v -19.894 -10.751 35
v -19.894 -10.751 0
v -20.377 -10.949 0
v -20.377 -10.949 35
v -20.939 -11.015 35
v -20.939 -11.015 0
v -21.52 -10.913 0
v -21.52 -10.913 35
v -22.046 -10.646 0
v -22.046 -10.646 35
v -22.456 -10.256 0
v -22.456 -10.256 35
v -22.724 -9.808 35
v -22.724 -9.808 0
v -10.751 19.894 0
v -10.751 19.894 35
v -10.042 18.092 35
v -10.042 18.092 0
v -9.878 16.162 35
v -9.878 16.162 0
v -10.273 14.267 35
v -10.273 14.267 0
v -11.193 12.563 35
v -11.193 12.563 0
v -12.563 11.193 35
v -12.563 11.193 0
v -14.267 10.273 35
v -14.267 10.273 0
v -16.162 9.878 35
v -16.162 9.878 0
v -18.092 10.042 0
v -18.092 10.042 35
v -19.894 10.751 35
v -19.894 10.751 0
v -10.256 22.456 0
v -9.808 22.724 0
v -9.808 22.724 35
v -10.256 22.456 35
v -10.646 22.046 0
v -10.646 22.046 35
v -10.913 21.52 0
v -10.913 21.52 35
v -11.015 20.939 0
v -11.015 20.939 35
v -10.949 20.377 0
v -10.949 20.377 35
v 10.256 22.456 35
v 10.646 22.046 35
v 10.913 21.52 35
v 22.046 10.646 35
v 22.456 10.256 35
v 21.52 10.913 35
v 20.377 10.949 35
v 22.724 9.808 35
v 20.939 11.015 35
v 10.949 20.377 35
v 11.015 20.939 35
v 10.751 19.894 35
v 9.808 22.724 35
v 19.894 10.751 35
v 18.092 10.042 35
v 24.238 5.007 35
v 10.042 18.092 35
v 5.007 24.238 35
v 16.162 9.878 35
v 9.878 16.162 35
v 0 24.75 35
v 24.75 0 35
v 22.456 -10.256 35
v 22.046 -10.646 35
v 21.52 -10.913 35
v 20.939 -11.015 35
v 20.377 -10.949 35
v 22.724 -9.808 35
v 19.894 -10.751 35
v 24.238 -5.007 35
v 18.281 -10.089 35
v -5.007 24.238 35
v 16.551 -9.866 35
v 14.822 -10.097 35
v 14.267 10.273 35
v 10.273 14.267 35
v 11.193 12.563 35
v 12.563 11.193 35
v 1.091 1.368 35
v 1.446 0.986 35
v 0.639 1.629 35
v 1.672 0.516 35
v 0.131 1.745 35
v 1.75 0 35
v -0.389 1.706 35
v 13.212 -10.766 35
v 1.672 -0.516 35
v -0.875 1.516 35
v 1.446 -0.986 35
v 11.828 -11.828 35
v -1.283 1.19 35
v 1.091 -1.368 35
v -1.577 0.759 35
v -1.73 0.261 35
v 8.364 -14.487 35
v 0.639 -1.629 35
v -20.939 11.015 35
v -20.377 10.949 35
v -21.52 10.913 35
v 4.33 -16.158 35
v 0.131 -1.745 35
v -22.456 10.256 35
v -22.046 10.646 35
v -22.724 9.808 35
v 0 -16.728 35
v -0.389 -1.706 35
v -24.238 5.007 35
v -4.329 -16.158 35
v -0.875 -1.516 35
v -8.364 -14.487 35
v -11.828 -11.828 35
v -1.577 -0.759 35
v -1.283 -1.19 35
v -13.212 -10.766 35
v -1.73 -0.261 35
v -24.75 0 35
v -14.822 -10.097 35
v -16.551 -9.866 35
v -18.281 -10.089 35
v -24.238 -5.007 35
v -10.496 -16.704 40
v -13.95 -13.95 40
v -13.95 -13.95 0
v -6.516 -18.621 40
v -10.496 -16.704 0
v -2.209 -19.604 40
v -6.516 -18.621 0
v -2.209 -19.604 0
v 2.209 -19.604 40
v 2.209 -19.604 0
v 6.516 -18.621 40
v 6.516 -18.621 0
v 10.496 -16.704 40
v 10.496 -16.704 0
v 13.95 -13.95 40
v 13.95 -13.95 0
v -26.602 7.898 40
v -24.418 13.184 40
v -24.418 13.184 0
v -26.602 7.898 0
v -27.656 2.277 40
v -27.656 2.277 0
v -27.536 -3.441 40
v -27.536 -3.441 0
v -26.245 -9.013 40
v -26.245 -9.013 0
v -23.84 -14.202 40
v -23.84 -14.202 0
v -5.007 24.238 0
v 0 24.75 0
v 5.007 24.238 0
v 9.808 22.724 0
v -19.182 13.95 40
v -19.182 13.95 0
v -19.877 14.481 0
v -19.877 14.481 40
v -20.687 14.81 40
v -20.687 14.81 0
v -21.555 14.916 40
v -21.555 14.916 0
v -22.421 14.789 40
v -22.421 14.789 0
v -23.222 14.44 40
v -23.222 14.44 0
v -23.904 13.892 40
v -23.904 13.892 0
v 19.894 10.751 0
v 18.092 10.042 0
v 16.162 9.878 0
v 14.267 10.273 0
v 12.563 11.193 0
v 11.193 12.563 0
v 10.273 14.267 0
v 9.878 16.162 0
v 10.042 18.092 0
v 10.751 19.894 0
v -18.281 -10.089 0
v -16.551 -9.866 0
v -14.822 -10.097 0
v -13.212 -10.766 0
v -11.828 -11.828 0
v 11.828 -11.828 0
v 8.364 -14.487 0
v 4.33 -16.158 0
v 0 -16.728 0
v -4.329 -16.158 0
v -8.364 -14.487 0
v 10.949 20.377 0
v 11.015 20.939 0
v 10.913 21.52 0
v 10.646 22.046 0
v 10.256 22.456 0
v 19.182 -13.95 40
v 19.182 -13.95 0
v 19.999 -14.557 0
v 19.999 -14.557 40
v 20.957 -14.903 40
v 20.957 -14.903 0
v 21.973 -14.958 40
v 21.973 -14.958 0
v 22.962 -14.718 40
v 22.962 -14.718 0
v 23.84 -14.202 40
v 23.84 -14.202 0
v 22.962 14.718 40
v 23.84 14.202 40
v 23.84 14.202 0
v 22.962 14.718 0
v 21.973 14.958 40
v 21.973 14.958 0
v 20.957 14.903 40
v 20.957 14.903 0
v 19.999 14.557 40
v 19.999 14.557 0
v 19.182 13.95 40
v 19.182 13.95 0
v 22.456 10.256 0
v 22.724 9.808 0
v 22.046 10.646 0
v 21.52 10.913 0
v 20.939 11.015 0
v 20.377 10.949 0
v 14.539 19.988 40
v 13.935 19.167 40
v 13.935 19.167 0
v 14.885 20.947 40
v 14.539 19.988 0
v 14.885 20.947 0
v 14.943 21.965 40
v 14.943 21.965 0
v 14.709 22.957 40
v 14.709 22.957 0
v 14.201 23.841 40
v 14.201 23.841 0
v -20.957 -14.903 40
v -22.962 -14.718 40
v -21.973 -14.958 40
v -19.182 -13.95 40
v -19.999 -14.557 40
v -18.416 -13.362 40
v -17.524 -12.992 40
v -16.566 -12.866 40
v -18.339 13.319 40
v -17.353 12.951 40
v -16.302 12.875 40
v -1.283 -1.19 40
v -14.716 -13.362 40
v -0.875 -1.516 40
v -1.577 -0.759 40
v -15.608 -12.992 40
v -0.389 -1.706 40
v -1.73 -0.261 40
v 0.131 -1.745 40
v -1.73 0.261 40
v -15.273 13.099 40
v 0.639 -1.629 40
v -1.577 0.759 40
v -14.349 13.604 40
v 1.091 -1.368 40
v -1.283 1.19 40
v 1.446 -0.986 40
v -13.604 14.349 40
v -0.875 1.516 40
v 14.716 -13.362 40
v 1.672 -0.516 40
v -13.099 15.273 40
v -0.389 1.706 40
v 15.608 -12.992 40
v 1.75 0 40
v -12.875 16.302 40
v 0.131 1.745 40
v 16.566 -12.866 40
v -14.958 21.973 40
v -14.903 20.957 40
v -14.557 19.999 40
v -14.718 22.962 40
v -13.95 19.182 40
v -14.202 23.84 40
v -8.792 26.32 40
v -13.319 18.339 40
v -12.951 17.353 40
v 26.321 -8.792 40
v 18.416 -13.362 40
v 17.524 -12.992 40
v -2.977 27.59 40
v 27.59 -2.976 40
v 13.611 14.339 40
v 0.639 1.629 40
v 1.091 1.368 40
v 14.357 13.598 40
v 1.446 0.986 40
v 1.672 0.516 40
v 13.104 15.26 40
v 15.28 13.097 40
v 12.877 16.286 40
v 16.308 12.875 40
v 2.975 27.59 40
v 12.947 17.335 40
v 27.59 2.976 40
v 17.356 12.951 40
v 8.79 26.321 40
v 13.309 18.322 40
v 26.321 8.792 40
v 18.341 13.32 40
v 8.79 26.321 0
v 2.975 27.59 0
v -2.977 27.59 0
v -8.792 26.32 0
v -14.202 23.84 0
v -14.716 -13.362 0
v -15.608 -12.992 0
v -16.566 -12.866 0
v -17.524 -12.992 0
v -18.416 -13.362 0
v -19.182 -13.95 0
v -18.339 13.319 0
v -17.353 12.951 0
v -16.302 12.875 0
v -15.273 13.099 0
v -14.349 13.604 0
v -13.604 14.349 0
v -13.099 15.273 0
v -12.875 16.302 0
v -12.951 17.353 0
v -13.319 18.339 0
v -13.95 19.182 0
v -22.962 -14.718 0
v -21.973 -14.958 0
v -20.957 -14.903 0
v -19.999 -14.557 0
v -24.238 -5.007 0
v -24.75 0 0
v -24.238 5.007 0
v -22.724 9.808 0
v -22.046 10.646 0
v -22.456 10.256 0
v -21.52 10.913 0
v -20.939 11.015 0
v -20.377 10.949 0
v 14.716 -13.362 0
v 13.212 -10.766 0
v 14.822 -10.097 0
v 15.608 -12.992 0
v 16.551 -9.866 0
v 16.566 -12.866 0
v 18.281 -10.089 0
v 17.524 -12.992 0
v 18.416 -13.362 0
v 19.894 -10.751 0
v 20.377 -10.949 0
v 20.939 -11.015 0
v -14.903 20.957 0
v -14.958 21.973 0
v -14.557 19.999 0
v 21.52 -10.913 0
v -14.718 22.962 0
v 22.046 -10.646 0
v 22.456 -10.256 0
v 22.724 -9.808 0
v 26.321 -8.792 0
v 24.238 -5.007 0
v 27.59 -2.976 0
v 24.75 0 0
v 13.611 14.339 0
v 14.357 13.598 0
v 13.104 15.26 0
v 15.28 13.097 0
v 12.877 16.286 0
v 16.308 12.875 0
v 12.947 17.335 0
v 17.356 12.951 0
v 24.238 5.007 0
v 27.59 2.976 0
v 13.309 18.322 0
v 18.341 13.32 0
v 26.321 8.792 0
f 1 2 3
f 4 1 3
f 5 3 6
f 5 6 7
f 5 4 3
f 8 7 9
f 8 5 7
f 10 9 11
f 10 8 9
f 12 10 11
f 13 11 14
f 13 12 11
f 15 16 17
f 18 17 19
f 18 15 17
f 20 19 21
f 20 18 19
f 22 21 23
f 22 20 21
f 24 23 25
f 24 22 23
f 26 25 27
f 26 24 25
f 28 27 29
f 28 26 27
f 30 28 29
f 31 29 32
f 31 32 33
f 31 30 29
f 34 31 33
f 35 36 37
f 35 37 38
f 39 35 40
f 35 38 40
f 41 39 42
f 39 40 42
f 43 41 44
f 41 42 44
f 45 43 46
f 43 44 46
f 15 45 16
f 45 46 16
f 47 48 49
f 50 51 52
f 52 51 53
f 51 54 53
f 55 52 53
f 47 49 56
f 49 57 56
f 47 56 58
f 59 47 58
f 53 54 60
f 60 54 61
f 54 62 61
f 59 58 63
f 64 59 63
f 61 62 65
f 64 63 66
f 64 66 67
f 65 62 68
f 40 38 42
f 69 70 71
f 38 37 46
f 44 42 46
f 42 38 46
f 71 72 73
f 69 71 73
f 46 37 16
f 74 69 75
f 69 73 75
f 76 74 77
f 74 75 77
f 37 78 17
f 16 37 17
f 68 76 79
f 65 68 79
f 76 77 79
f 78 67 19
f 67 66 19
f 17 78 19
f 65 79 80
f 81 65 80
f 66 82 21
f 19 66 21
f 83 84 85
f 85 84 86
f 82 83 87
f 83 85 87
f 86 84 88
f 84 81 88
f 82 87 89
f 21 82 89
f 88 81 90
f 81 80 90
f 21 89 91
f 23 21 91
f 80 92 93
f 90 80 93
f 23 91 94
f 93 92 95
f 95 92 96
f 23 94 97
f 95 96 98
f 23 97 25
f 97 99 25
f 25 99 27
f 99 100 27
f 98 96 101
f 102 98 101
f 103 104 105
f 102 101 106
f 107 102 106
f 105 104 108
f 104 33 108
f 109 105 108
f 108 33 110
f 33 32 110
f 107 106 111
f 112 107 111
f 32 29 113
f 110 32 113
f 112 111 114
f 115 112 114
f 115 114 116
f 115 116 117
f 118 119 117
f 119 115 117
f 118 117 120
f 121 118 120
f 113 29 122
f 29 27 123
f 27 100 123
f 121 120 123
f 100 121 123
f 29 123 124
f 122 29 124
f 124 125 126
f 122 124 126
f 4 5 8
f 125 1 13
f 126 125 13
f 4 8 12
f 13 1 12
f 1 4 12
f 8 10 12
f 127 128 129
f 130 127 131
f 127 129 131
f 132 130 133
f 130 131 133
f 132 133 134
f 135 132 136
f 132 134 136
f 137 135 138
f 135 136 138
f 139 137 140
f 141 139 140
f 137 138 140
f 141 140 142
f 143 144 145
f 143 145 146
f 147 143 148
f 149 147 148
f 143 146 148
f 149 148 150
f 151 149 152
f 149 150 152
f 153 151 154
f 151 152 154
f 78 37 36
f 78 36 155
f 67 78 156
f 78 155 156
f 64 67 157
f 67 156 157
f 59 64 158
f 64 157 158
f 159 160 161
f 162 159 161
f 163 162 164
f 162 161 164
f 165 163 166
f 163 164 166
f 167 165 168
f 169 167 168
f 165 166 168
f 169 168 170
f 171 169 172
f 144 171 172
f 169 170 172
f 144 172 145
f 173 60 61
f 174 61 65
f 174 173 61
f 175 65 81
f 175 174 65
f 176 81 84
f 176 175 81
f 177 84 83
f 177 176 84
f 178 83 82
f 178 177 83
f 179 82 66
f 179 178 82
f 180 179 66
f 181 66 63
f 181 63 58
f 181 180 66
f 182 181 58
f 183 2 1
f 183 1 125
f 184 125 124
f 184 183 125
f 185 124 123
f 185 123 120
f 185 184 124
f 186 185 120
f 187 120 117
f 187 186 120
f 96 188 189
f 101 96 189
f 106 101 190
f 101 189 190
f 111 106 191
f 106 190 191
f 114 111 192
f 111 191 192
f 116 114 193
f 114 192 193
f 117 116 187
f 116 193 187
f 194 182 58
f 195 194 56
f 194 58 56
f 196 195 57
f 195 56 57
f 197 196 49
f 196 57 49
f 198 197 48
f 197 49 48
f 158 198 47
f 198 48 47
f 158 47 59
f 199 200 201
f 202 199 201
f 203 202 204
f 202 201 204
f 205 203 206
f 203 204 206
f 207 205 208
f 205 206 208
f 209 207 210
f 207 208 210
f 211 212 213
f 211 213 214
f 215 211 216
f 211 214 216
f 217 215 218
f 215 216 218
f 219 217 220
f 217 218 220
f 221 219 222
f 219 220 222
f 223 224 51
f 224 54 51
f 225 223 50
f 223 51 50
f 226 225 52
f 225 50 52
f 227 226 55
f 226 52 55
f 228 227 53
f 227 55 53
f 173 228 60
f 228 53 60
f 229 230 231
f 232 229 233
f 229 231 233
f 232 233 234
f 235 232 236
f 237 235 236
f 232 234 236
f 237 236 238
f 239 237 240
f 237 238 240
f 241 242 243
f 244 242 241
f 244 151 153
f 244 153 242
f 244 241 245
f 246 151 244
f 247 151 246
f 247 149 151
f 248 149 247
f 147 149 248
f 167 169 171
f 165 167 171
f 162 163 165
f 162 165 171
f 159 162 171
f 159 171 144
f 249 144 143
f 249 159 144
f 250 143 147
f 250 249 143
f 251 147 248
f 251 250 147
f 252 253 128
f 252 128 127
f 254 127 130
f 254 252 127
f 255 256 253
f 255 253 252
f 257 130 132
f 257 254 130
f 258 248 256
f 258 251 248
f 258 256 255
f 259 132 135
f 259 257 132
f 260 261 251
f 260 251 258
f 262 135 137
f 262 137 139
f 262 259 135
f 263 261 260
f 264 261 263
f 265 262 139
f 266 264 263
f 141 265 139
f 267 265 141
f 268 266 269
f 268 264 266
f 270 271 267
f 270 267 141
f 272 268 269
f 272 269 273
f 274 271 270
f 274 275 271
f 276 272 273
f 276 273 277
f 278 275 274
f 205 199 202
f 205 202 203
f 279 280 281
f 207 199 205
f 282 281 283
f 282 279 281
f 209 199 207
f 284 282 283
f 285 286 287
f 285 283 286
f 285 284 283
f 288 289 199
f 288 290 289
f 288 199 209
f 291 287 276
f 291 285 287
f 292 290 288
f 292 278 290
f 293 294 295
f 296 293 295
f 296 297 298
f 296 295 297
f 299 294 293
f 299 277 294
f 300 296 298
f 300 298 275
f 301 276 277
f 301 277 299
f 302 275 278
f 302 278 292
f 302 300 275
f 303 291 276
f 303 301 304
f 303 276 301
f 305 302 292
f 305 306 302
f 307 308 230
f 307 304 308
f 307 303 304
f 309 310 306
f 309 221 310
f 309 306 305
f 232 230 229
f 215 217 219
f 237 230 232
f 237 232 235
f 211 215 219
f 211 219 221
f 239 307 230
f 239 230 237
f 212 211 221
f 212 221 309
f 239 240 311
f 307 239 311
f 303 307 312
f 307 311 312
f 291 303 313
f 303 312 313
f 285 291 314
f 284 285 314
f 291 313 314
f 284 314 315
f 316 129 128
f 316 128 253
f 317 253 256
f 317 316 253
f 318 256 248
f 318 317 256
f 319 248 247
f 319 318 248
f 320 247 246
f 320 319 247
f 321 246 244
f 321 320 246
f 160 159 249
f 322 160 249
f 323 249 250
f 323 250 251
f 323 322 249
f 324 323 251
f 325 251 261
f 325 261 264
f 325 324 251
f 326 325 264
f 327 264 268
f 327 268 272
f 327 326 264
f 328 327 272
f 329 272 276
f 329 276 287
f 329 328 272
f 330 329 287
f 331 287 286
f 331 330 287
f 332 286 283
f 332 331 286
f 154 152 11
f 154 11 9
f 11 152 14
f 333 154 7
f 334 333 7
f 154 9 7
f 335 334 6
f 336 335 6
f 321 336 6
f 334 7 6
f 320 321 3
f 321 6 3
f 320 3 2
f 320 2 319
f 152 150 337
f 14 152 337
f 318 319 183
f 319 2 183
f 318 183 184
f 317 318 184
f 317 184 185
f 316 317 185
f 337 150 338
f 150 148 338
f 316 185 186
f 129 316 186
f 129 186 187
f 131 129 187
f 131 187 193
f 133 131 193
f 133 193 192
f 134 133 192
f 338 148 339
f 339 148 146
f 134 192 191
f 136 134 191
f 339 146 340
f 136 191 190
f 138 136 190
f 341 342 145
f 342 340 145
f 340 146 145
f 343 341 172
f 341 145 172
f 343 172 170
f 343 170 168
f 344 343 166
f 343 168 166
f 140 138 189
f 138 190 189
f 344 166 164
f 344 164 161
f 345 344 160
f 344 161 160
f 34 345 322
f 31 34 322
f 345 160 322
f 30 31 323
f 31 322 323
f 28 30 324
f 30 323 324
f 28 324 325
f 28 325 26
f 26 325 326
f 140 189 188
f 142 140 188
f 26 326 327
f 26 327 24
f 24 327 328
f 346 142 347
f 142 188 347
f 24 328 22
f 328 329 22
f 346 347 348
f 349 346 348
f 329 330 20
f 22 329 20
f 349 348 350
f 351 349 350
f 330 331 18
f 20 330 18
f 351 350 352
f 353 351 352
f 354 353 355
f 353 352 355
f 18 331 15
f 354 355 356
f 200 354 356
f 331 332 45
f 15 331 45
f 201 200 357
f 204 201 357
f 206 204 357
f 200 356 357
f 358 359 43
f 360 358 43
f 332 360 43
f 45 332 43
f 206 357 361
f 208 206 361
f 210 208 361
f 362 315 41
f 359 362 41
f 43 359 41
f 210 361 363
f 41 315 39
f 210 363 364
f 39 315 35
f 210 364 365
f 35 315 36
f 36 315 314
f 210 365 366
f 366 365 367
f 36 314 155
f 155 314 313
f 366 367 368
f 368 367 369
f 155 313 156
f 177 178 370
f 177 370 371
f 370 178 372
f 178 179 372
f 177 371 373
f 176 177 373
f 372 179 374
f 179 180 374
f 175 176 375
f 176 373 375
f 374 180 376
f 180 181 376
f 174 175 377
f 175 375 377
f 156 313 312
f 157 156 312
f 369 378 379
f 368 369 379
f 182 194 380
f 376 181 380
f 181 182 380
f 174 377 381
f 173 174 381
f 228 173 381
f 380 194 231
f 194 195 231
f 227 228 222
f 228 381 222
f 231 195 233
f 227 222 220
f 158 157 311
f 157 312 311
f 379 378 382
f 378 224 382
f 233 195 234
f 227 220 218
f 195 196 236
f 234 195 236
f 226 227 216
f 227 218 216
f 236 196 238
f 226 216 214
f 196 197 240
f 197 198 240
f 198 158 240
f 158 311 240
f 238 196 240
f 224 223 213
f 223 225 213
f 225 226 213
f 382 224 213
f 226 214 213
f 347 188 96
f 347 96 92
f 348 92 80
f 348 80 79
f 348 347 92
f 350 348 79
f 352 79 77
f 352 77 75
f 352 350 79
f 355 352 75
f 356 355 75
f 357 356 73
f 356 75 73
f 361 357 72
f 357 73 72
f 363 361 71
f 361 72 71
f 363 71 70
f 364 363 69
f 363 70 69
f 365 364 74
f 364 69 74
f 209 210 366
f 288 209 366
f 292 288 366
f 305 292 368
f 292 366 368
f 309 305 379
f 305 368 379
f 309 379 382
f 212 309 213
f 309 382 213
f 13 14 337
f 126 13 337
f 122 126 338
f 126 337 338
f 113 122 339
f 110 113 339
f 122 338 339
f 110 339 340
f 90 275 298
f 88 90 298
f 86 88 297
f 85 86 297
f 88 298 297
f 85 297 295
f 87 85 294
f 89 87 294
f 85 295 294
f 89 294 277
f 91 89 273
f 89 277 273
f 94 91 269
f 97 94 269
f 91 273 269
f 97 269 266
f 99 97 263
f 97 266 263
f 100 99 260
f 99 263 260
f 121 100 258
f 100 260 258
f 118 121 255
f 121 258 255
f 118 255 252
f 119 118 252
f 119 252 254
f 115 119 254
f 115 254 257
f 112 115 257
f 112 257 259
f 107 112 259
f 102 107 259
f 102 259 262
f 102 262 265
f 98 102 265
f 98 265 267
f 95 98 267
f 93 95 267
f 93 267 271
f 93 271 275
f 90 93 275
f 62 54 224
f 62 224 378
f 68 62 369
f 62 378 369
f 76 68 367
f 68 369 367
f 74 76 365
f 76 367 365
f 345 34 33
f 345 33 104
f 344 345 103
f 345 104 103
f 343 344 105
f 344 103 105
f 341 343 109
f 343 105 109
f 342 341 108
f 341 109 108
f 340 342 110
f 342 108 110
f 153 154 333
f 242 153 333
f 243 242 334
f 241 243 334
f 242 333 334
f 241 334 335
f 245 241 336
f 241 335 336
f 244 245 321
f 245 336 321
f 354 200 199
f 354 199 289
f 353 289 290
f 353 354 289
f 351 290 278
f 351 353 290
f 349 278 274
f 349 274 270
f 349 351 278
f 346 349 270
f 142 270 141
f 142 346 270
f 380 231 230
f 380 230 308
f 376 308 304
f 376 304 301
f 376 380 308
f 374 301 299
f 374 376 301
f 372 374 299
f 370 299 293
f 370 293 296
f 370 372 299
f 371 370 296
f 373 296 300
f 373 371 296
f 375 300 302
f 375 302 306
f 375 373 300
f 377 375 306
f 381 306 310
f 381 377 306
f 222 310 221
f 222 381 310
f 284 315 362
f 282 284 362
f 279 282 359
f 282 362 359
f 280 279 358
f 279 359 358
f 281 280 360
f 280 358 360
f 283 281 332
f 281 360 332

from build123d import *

# Parameters (mm, degrees)
PAD_DEPTH       = 40
POCKET_DEPTH    = 35
FILLET_R        = 2
SKETCH002_R     = 1.75
POCKET001_DEPTH = 40.001


with BuildPart() as part:
    # Sketch → Pad (new body)
    with BuildSketch(Plane.XY):
        with BuildLine():
            ThreePointArc((14.201108, 23.840953), (-0.00078, 27.75), (-14.202448, 23.840154))
            ThreePointArc((-14.202448, 23.840154), (-14.967616, 21.462867), (-13.949732, 19.182322))
            ThreePointArc((-19.182322, 13.949732), (-13.949732, 13.949732), (-13.949732, 19.182322))
            ThreePointArc((-19.182322, 13.949732), (-21.992232, 14.881289), (-24.417911, 13.184389))
            ThreePointArc((-24.417911, 13.184389), (-27.743827, -0.585306), (-23.840136, -14.202479))
            ThreePointArc((-23.840136, -14.202479), (-21.462853, -14.967618), (-19.182322, -13.949732))
            ThreePointArc((-13.949732, -13.949732), (-16.566027, -12.866027), (-19.182322, -13.949732))
            ThreePointArc((-13.949732, -13.949732), (0, -19.7279), (13.949732, -13.949732))
            ThreePointArc((19.182322, -13.949732), (16.566027, -12.866027), (13.949732, -13.949732))
            ThreePointArc((19.182322, -13.949732), (21.462854, -14.967618), (23.840137, -14.202477))
            ThreePointArc((23.840137, -14.202477), (27.75, -4.3e-05), (23.840181, 14.202403))
            ThreePointArc((23.840181, 14.202403), (21.462879, 14.967595), (19.182307, 13.949717))
            ThreePointArc((13.934503, 19.167004), (13.957373, 13.942113), (19.182307, 13.949717))
            ThreePointArc((13.934503, 19.167004), (14.950896, 21.453606), (14.201108, 23.840953))
        make_face()
    extrude(amount=PAD_DEPTH)

    # Sketch001 (on Face15 of Pad) → Pocket (cut)
    with BuildSketch(Plane(origin=(0, 0, 0), x_dir=(1, 0, 0), z_dir=(0, 0, -1))):
        with BuildLine():
            ThreePointArc((-21.578938, 12.120723), (-16.766795, 9.869036), (-11.828409, 11.828414))
            ThreePointArc((11.828412, 11.828411), (2e-06, 16.7279), (-11.828409, 11.828414))
            ThreePointArc((11.828412, 11.828411), (16.766797, 9.869036), (21.578938, 12.120723))
            ThreePointArc((21.578938, -12.120723), (24.75, 0), (21.578938, 12.120723))
            ThreePointArc((21.578938, -12.120723), (11.828412, -11.828412), (12.120723, -21.578938))
            ThreePointArc((-12.120723, -21.578938), (0, -24.75), (12.120723, -21.578938))
            ThreePointArc((-12.120723, -21.578938), (-11.828412, -11.828412), (-21.578938, -12.120723))
            ThreePointArc((-21.578938, 12.120723), (-24.75, 0), (-21.578938, -12.120723))
        make_face()
    extrude(amount=-POCKET_DEPTH, mode=Mode.SUBTRACT)

    # Fillet
    fillet_edges = [part.edges().sort_by_distance(p)[0] for p in [
        (-21.578938, 12.120723, 17.5),
        (-12.120723, 21.578938, 17.5),
        (12.120723, 21.578938, 17.5),
        (21.578938, 12.120723, 17.5),
        (21.578938, -12.120723, 17.5),
        (-21.578938, -12.120723, 17.5),
    ]]
    fillet(fillet_edges, radius=FILLET_R)

    # Sketch002 (on Face31 of Fillet) → Pocket001 (cut, through all)
    with BuildSketch(Plane.XY.offset(40)):
        Circle(SKETCH002_R)
    extrude(amount=-POCKET001_DEPTH, mode=Mode.SUBTRACT)


solid = part.part
